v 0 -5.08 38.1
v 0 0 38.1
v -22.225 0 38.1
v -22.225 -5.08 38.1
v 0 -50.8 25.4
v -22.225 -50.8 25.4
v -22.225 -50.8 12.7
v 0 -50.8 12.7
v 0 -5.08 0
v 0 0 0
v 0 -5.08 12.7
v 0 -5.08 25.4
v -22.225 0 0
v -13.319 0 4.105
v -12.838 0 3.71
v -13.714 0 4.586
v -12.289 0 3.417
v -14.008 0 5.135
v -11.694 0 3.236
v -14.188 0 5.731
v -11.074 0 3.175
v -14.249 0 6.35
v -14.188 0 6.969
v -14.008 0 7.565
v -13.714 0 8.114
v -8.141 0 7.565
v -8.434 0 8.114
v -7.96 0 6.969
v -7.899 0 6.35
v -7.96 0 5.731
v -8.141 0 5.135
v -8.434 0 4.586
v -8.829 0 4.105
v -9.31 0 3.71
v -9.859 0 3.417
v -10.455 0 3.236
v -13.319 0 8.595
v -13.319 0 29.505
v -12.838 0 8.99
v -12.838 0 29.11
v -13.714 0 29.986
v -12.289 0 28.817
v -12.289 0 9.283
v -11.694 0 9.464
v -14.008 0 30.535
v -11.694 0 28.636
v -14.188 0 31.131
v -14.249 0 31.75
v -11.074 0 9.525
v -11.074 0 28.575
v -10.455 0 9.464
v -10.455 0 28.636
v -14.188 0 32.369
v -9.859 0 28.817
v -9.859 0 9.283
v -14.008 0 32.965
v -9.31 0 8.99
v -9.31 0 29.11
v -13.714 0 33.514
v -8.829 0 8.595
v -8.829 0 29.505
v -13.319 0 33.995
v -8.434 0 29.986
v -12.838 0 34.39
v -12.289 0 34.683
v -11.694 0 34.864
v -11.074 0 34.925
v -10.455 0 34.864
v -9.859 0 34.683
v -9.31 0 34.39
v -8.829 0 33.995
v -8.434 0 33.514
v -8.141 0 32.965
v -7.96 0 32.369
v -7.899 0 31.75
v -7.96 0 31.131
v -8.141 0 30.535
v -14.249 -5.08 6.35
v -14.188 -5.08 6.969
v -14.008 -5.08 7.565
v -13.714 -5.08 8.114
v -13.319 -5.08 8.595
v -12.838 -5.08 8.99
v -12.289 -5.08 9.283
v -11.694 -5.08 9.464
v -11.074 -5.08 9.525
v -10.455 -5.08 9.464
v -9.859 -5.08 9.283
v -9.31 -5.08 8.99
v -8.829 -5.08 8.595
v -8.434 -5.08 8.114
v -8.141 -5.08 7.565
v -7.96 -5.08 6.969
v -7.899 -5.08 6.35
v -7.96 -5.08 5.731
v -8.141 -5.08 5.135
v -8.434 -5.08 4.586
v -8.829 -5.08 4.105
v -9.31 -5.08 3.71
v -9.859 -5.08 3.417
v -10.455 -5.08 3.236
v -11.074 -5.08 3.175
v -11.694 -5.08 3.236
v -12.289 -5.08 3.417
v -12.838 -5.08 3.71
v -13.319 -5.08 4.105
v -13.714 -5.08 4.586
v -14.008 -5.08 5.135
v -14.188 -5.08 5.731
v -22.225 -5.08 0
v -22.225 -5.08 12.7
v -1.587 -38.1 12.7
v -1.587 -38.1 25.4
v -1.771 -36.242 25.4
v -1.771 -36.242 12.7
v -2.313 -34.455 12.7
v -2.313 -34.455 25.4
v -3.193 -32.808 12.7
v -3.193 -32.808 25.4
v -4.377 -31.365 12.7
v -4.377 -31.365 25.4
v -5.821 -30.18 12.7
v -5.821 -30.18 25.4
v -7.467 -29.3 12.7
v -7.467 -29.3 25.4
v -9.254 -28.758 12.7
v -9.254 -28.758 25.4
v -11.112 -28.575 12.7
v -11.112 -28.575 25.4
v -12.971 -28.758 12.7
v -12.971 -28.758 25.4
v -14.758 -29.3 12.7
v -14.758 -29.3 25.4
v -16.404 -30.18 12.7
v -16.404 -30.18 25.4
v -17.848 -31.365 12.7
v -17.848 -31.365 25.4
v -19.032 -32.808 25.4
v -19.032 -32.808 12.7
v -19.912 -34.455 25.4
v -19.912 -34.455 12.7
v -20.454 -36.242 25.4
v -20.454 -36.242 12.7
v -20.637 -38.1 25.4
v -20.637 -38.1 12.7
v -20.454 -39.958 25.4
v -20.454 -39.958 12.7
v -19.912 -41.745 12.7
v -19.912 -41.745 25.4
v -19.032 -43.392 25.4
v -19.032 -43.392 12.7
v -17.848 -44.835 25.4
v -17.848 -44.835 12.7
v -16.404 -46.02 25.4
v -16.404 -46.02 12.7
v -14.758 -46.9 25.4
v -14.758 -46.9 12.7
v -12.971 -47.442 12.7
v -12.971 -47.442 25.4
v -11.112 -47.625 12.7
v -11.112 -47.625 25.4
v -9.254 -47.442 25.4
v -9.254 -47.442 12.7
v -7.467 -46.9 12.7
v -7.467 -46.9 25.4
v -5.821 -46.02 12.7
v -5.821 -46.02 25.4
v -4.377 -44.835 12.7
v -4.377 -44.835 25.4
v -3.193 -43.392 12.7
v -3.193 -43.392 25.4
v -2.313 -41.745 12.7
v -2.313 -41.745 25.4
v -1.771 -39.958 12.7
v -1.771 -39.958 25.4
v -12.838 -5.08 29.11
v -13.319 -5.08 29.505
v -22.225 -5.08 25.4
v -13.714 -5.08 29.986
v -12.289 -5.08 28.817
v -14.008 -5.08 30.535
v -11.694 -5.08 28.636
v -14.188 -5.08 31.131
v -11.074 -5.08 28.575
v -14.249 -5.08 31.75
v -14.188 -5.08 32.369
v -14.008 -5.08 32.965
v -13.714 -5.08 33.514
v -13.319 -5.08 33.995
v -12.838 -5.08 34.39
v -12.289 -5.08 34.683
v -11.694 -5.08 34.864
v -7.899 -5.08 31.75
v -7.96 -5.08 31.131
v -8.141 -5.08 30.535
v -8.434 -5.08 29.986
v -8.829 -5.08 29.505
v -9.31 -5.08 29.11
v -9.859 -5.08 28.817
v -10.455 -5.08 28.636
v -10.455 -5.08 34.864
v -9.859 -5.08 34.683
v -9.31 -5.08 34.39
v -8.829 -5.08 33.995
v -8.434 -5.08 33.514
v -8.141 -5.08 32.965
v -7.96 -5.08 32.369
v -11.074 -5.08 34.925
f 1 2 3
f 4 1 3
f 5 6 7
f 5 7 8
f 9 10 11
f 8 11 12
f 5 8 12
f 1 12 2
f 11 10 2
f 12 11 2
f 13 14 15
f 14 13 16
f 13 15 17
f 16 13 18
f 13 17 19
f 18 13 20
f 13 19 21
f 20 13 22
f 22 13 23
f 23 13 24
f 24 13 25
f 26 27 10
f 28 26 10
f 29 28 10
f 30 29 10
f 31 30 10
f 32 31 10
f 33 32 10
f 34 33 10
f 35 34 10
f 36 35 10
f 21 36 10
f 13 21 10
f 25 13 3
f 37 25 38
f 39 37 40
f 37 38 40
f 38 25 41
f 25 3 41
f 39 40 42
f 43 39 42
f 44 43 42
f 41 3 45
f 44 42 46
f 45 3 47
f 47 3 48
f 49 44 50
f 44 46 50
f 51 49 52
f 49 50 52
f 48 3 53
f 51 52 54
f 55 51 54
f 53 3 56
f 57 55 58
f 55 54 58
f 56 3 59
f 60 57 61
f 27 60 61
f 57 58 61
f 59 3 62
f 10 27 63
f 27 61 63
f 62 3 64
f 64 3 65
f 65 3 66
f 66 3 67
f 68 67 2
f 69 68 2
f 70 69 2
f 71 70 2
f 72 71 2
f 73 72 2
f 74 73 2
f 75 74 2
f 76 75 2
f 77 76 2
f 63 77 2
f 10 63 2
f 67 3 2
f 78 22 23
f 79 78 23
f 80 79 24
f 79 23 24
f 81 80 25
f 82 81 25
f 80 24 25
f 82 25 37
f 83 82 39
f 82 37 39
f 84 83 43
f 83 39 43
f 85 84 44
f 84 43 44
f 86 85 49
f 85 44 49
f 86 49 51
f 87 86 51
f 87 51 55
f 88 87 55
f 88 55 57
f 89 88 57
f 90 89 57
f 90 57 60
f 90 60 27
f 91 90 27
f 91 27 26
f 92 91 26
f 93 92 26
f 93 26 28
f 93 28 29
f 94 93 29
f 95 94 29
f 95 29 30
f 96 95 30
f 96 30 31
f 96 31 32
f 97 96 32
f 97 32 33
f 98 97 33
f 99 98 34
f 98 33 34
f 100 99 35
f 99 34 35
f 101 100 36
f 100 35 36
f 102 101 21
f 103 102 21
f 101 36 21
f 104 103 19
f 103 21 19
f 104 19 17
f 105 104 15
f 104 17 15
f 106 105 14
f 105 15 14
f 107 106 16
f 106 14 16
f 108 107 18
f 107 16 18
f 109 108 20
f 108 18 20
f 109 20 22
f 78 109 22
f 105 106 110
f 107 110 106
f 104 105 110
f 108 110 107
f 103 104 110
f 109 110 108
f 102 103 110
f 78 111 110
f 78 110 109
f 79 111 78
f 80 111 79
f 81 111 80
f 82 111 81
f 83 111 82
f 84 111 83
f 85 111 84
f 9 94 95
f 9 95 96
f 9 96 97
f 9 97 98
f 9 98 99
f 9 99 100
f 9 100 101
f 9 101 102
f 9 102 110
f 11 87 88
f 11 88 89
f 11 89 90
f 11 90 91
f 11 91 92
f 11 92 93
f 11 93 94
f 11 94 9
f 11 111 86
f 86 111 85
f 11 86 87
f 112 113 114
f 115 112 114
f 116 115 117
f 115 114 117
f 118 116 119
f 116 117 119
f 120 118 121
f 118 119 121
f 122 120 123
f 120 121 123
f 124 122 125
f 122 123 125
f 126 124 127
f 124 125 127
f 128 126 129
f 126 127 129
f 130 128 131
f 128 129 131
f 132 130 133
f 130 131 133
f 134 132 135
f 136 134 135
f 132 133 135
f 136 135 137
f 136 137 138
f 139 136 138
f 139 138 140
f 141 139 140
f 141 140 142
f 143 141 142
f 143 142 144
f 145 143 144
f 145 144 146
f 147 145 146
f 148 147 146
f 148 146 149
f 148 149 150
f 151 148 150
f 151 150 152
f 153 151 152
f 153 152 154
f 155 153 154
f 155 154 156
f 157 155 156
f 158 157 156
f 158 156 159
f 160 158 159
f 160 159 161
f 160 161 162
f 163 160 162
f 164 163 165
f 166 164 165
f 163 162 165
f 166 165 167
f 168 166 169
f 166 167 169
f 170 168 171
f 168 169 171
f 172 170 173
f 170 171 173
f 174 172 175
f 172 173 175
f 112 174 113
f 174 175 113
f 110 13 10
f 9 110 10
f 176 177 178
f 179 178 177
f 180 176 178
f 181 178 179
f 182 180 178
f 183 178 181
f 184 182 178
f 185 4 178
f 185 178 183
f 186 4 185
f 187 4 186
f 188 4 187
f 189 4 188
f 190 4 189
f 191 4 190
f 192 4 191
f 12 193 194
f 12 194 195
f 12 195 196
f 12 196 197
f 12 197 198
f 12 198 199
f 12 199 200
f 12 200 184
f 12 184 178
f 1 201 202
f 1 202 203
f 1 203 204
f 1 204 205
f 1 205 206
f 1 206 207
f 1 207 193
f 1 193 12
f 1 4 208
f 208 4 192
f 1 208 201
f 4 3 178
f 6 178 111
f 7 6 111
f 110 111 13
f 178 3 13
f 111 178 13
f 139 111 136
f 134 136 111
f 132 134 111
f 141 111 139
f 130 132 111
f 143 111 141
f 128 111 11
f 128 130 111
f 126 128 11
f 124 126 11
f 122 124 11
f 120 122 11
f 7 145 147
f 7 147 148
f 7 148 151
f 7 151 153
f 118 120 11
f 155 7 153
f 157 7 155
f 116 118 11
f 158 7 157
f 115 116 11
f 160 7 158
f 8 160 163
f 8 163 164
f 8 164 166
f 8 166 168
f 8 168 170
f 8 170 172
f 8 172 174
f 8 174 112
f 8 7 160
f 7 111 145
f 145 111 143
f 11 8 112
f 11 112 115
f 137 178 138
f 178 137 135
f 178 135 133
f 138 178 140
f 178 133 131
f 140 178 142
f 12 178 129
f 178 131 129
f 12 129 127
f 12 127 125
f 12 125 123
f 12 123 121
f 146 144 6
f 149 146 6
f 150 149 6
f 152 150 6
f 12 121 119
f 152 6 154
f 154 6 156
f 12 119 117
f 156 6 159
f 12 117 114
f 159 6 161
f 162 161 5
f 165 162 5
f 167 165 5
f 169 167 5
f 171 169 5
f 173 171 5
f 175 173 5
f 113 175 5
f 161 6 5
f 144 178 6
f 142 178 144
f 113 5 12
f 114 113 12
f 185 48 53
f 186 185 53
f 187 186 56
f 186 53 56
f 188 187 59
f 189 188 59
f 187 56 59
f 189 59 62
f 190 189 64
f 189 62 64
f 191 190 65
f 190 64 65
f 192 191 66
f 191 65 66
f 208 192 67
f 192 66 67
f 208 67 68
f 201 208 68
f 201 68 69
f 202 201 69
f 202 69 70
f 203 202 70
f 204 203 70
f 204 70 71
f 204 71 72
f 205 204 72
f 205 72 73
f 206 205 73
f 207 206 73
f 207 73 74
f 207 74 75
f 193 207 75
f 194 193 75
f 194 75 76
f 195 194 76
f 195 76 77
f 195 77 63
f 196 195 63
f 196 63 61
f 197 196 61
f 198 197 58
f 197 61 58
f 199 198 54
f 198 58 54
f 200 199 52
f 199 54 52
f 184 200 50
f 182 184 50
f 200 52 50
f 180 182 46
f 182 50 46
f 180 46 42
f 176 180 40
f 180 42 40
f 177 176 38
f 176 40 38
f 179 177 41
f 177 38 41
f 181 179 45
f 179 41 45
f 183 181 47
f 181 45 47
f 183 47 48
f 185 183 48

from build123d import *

# Parameters (mm, degrees)
F1_DEPTH = 50.8
F2_W     = 22.225
F2_H     = 12.7
F3_DEPTH = 45.72
F5_DEPTH = 25.401


with BuildPart() as f1:
    # F0 (on Front) → F1 (new body)
    with BuildSketch(Plane.XZ):
        with BuildLine():
            ThreePointArc((-7.8994, 31.75), (-11.0744, 34.925), (-14.2494, 31.75))
            ThreePointArc((-14.2494, 31.75), (-11.0744, 28.575), (-7.8994, 31.75))
        make_face()
        with BuildLine():
            ThreePointArc((-7.8994, 6.35), (-11.0744, 9.525), (-14.2494, 6.35))
            ThreePointArc((-14.2494, 6.35), (-11.0744, 3.175), (-7.8994, 6.35))
        make_face()
        Polygon((-22.225, 0), (0, 0), (0, 38.1), (-22.225, 38.1), (-22.225, 31.75), (-22.225, 25.4), (-22.225, 12.7), (-22.225, 6.35), align=None)
        with BuildLine():
            ThreePointArc((-7.8994, 6.35), (-11.0744, 3.175), (-14.2494, 6.35))
            ThreePointArc((-14.2494, 6.35), (-11.0744, 9.525), (-7.8994, 6.35))
        make_face(mode=Mode.SUBTRACT)
        with BuildLine():
            ThreePointArc((-7.8994, 31.75), (-11.0744, 28.575), (-14.2494, 31.75))
            ThreePointArc((-14.2494, 31.75), (-11.0744, 34.925), (-7.8994, 31.75))
        make_face(mode=Mode.SUBTRACT)
    extrude(amount=F1_DEPTH)

    # F2 (on face) → F3 (cut)
    with BuildSketch(Plane.XZ.offset(50.8)):
        with Locations((-11.1125, 31.75)):
            Rectangle(F2_W, F2_H)
        with Locations((-11.1125, 6.35)):
            Rectangle(F2_W, F2_H)
    extrude(amount=-F3_DEPTH, mode=Mode.SUBTRACT)

    # F4 (on face) → F5 (cut, through all)
    with BuildSketch(Plane.XY.offset(25.4)):
        with BuildLine():
            ThreePointArc((-11.1125, -47.625), (-4.377308, -44.835192), (-1.5875, -38.1))
            ThreePointArc((-1.5875, -38.1), (-17.847692, -31.364808), (-11.1125, -47.625))
        make_face()
    extrude(amount=-F5_DEPTH, mode=Mode.SUBTRACT)


solid = f1.part
